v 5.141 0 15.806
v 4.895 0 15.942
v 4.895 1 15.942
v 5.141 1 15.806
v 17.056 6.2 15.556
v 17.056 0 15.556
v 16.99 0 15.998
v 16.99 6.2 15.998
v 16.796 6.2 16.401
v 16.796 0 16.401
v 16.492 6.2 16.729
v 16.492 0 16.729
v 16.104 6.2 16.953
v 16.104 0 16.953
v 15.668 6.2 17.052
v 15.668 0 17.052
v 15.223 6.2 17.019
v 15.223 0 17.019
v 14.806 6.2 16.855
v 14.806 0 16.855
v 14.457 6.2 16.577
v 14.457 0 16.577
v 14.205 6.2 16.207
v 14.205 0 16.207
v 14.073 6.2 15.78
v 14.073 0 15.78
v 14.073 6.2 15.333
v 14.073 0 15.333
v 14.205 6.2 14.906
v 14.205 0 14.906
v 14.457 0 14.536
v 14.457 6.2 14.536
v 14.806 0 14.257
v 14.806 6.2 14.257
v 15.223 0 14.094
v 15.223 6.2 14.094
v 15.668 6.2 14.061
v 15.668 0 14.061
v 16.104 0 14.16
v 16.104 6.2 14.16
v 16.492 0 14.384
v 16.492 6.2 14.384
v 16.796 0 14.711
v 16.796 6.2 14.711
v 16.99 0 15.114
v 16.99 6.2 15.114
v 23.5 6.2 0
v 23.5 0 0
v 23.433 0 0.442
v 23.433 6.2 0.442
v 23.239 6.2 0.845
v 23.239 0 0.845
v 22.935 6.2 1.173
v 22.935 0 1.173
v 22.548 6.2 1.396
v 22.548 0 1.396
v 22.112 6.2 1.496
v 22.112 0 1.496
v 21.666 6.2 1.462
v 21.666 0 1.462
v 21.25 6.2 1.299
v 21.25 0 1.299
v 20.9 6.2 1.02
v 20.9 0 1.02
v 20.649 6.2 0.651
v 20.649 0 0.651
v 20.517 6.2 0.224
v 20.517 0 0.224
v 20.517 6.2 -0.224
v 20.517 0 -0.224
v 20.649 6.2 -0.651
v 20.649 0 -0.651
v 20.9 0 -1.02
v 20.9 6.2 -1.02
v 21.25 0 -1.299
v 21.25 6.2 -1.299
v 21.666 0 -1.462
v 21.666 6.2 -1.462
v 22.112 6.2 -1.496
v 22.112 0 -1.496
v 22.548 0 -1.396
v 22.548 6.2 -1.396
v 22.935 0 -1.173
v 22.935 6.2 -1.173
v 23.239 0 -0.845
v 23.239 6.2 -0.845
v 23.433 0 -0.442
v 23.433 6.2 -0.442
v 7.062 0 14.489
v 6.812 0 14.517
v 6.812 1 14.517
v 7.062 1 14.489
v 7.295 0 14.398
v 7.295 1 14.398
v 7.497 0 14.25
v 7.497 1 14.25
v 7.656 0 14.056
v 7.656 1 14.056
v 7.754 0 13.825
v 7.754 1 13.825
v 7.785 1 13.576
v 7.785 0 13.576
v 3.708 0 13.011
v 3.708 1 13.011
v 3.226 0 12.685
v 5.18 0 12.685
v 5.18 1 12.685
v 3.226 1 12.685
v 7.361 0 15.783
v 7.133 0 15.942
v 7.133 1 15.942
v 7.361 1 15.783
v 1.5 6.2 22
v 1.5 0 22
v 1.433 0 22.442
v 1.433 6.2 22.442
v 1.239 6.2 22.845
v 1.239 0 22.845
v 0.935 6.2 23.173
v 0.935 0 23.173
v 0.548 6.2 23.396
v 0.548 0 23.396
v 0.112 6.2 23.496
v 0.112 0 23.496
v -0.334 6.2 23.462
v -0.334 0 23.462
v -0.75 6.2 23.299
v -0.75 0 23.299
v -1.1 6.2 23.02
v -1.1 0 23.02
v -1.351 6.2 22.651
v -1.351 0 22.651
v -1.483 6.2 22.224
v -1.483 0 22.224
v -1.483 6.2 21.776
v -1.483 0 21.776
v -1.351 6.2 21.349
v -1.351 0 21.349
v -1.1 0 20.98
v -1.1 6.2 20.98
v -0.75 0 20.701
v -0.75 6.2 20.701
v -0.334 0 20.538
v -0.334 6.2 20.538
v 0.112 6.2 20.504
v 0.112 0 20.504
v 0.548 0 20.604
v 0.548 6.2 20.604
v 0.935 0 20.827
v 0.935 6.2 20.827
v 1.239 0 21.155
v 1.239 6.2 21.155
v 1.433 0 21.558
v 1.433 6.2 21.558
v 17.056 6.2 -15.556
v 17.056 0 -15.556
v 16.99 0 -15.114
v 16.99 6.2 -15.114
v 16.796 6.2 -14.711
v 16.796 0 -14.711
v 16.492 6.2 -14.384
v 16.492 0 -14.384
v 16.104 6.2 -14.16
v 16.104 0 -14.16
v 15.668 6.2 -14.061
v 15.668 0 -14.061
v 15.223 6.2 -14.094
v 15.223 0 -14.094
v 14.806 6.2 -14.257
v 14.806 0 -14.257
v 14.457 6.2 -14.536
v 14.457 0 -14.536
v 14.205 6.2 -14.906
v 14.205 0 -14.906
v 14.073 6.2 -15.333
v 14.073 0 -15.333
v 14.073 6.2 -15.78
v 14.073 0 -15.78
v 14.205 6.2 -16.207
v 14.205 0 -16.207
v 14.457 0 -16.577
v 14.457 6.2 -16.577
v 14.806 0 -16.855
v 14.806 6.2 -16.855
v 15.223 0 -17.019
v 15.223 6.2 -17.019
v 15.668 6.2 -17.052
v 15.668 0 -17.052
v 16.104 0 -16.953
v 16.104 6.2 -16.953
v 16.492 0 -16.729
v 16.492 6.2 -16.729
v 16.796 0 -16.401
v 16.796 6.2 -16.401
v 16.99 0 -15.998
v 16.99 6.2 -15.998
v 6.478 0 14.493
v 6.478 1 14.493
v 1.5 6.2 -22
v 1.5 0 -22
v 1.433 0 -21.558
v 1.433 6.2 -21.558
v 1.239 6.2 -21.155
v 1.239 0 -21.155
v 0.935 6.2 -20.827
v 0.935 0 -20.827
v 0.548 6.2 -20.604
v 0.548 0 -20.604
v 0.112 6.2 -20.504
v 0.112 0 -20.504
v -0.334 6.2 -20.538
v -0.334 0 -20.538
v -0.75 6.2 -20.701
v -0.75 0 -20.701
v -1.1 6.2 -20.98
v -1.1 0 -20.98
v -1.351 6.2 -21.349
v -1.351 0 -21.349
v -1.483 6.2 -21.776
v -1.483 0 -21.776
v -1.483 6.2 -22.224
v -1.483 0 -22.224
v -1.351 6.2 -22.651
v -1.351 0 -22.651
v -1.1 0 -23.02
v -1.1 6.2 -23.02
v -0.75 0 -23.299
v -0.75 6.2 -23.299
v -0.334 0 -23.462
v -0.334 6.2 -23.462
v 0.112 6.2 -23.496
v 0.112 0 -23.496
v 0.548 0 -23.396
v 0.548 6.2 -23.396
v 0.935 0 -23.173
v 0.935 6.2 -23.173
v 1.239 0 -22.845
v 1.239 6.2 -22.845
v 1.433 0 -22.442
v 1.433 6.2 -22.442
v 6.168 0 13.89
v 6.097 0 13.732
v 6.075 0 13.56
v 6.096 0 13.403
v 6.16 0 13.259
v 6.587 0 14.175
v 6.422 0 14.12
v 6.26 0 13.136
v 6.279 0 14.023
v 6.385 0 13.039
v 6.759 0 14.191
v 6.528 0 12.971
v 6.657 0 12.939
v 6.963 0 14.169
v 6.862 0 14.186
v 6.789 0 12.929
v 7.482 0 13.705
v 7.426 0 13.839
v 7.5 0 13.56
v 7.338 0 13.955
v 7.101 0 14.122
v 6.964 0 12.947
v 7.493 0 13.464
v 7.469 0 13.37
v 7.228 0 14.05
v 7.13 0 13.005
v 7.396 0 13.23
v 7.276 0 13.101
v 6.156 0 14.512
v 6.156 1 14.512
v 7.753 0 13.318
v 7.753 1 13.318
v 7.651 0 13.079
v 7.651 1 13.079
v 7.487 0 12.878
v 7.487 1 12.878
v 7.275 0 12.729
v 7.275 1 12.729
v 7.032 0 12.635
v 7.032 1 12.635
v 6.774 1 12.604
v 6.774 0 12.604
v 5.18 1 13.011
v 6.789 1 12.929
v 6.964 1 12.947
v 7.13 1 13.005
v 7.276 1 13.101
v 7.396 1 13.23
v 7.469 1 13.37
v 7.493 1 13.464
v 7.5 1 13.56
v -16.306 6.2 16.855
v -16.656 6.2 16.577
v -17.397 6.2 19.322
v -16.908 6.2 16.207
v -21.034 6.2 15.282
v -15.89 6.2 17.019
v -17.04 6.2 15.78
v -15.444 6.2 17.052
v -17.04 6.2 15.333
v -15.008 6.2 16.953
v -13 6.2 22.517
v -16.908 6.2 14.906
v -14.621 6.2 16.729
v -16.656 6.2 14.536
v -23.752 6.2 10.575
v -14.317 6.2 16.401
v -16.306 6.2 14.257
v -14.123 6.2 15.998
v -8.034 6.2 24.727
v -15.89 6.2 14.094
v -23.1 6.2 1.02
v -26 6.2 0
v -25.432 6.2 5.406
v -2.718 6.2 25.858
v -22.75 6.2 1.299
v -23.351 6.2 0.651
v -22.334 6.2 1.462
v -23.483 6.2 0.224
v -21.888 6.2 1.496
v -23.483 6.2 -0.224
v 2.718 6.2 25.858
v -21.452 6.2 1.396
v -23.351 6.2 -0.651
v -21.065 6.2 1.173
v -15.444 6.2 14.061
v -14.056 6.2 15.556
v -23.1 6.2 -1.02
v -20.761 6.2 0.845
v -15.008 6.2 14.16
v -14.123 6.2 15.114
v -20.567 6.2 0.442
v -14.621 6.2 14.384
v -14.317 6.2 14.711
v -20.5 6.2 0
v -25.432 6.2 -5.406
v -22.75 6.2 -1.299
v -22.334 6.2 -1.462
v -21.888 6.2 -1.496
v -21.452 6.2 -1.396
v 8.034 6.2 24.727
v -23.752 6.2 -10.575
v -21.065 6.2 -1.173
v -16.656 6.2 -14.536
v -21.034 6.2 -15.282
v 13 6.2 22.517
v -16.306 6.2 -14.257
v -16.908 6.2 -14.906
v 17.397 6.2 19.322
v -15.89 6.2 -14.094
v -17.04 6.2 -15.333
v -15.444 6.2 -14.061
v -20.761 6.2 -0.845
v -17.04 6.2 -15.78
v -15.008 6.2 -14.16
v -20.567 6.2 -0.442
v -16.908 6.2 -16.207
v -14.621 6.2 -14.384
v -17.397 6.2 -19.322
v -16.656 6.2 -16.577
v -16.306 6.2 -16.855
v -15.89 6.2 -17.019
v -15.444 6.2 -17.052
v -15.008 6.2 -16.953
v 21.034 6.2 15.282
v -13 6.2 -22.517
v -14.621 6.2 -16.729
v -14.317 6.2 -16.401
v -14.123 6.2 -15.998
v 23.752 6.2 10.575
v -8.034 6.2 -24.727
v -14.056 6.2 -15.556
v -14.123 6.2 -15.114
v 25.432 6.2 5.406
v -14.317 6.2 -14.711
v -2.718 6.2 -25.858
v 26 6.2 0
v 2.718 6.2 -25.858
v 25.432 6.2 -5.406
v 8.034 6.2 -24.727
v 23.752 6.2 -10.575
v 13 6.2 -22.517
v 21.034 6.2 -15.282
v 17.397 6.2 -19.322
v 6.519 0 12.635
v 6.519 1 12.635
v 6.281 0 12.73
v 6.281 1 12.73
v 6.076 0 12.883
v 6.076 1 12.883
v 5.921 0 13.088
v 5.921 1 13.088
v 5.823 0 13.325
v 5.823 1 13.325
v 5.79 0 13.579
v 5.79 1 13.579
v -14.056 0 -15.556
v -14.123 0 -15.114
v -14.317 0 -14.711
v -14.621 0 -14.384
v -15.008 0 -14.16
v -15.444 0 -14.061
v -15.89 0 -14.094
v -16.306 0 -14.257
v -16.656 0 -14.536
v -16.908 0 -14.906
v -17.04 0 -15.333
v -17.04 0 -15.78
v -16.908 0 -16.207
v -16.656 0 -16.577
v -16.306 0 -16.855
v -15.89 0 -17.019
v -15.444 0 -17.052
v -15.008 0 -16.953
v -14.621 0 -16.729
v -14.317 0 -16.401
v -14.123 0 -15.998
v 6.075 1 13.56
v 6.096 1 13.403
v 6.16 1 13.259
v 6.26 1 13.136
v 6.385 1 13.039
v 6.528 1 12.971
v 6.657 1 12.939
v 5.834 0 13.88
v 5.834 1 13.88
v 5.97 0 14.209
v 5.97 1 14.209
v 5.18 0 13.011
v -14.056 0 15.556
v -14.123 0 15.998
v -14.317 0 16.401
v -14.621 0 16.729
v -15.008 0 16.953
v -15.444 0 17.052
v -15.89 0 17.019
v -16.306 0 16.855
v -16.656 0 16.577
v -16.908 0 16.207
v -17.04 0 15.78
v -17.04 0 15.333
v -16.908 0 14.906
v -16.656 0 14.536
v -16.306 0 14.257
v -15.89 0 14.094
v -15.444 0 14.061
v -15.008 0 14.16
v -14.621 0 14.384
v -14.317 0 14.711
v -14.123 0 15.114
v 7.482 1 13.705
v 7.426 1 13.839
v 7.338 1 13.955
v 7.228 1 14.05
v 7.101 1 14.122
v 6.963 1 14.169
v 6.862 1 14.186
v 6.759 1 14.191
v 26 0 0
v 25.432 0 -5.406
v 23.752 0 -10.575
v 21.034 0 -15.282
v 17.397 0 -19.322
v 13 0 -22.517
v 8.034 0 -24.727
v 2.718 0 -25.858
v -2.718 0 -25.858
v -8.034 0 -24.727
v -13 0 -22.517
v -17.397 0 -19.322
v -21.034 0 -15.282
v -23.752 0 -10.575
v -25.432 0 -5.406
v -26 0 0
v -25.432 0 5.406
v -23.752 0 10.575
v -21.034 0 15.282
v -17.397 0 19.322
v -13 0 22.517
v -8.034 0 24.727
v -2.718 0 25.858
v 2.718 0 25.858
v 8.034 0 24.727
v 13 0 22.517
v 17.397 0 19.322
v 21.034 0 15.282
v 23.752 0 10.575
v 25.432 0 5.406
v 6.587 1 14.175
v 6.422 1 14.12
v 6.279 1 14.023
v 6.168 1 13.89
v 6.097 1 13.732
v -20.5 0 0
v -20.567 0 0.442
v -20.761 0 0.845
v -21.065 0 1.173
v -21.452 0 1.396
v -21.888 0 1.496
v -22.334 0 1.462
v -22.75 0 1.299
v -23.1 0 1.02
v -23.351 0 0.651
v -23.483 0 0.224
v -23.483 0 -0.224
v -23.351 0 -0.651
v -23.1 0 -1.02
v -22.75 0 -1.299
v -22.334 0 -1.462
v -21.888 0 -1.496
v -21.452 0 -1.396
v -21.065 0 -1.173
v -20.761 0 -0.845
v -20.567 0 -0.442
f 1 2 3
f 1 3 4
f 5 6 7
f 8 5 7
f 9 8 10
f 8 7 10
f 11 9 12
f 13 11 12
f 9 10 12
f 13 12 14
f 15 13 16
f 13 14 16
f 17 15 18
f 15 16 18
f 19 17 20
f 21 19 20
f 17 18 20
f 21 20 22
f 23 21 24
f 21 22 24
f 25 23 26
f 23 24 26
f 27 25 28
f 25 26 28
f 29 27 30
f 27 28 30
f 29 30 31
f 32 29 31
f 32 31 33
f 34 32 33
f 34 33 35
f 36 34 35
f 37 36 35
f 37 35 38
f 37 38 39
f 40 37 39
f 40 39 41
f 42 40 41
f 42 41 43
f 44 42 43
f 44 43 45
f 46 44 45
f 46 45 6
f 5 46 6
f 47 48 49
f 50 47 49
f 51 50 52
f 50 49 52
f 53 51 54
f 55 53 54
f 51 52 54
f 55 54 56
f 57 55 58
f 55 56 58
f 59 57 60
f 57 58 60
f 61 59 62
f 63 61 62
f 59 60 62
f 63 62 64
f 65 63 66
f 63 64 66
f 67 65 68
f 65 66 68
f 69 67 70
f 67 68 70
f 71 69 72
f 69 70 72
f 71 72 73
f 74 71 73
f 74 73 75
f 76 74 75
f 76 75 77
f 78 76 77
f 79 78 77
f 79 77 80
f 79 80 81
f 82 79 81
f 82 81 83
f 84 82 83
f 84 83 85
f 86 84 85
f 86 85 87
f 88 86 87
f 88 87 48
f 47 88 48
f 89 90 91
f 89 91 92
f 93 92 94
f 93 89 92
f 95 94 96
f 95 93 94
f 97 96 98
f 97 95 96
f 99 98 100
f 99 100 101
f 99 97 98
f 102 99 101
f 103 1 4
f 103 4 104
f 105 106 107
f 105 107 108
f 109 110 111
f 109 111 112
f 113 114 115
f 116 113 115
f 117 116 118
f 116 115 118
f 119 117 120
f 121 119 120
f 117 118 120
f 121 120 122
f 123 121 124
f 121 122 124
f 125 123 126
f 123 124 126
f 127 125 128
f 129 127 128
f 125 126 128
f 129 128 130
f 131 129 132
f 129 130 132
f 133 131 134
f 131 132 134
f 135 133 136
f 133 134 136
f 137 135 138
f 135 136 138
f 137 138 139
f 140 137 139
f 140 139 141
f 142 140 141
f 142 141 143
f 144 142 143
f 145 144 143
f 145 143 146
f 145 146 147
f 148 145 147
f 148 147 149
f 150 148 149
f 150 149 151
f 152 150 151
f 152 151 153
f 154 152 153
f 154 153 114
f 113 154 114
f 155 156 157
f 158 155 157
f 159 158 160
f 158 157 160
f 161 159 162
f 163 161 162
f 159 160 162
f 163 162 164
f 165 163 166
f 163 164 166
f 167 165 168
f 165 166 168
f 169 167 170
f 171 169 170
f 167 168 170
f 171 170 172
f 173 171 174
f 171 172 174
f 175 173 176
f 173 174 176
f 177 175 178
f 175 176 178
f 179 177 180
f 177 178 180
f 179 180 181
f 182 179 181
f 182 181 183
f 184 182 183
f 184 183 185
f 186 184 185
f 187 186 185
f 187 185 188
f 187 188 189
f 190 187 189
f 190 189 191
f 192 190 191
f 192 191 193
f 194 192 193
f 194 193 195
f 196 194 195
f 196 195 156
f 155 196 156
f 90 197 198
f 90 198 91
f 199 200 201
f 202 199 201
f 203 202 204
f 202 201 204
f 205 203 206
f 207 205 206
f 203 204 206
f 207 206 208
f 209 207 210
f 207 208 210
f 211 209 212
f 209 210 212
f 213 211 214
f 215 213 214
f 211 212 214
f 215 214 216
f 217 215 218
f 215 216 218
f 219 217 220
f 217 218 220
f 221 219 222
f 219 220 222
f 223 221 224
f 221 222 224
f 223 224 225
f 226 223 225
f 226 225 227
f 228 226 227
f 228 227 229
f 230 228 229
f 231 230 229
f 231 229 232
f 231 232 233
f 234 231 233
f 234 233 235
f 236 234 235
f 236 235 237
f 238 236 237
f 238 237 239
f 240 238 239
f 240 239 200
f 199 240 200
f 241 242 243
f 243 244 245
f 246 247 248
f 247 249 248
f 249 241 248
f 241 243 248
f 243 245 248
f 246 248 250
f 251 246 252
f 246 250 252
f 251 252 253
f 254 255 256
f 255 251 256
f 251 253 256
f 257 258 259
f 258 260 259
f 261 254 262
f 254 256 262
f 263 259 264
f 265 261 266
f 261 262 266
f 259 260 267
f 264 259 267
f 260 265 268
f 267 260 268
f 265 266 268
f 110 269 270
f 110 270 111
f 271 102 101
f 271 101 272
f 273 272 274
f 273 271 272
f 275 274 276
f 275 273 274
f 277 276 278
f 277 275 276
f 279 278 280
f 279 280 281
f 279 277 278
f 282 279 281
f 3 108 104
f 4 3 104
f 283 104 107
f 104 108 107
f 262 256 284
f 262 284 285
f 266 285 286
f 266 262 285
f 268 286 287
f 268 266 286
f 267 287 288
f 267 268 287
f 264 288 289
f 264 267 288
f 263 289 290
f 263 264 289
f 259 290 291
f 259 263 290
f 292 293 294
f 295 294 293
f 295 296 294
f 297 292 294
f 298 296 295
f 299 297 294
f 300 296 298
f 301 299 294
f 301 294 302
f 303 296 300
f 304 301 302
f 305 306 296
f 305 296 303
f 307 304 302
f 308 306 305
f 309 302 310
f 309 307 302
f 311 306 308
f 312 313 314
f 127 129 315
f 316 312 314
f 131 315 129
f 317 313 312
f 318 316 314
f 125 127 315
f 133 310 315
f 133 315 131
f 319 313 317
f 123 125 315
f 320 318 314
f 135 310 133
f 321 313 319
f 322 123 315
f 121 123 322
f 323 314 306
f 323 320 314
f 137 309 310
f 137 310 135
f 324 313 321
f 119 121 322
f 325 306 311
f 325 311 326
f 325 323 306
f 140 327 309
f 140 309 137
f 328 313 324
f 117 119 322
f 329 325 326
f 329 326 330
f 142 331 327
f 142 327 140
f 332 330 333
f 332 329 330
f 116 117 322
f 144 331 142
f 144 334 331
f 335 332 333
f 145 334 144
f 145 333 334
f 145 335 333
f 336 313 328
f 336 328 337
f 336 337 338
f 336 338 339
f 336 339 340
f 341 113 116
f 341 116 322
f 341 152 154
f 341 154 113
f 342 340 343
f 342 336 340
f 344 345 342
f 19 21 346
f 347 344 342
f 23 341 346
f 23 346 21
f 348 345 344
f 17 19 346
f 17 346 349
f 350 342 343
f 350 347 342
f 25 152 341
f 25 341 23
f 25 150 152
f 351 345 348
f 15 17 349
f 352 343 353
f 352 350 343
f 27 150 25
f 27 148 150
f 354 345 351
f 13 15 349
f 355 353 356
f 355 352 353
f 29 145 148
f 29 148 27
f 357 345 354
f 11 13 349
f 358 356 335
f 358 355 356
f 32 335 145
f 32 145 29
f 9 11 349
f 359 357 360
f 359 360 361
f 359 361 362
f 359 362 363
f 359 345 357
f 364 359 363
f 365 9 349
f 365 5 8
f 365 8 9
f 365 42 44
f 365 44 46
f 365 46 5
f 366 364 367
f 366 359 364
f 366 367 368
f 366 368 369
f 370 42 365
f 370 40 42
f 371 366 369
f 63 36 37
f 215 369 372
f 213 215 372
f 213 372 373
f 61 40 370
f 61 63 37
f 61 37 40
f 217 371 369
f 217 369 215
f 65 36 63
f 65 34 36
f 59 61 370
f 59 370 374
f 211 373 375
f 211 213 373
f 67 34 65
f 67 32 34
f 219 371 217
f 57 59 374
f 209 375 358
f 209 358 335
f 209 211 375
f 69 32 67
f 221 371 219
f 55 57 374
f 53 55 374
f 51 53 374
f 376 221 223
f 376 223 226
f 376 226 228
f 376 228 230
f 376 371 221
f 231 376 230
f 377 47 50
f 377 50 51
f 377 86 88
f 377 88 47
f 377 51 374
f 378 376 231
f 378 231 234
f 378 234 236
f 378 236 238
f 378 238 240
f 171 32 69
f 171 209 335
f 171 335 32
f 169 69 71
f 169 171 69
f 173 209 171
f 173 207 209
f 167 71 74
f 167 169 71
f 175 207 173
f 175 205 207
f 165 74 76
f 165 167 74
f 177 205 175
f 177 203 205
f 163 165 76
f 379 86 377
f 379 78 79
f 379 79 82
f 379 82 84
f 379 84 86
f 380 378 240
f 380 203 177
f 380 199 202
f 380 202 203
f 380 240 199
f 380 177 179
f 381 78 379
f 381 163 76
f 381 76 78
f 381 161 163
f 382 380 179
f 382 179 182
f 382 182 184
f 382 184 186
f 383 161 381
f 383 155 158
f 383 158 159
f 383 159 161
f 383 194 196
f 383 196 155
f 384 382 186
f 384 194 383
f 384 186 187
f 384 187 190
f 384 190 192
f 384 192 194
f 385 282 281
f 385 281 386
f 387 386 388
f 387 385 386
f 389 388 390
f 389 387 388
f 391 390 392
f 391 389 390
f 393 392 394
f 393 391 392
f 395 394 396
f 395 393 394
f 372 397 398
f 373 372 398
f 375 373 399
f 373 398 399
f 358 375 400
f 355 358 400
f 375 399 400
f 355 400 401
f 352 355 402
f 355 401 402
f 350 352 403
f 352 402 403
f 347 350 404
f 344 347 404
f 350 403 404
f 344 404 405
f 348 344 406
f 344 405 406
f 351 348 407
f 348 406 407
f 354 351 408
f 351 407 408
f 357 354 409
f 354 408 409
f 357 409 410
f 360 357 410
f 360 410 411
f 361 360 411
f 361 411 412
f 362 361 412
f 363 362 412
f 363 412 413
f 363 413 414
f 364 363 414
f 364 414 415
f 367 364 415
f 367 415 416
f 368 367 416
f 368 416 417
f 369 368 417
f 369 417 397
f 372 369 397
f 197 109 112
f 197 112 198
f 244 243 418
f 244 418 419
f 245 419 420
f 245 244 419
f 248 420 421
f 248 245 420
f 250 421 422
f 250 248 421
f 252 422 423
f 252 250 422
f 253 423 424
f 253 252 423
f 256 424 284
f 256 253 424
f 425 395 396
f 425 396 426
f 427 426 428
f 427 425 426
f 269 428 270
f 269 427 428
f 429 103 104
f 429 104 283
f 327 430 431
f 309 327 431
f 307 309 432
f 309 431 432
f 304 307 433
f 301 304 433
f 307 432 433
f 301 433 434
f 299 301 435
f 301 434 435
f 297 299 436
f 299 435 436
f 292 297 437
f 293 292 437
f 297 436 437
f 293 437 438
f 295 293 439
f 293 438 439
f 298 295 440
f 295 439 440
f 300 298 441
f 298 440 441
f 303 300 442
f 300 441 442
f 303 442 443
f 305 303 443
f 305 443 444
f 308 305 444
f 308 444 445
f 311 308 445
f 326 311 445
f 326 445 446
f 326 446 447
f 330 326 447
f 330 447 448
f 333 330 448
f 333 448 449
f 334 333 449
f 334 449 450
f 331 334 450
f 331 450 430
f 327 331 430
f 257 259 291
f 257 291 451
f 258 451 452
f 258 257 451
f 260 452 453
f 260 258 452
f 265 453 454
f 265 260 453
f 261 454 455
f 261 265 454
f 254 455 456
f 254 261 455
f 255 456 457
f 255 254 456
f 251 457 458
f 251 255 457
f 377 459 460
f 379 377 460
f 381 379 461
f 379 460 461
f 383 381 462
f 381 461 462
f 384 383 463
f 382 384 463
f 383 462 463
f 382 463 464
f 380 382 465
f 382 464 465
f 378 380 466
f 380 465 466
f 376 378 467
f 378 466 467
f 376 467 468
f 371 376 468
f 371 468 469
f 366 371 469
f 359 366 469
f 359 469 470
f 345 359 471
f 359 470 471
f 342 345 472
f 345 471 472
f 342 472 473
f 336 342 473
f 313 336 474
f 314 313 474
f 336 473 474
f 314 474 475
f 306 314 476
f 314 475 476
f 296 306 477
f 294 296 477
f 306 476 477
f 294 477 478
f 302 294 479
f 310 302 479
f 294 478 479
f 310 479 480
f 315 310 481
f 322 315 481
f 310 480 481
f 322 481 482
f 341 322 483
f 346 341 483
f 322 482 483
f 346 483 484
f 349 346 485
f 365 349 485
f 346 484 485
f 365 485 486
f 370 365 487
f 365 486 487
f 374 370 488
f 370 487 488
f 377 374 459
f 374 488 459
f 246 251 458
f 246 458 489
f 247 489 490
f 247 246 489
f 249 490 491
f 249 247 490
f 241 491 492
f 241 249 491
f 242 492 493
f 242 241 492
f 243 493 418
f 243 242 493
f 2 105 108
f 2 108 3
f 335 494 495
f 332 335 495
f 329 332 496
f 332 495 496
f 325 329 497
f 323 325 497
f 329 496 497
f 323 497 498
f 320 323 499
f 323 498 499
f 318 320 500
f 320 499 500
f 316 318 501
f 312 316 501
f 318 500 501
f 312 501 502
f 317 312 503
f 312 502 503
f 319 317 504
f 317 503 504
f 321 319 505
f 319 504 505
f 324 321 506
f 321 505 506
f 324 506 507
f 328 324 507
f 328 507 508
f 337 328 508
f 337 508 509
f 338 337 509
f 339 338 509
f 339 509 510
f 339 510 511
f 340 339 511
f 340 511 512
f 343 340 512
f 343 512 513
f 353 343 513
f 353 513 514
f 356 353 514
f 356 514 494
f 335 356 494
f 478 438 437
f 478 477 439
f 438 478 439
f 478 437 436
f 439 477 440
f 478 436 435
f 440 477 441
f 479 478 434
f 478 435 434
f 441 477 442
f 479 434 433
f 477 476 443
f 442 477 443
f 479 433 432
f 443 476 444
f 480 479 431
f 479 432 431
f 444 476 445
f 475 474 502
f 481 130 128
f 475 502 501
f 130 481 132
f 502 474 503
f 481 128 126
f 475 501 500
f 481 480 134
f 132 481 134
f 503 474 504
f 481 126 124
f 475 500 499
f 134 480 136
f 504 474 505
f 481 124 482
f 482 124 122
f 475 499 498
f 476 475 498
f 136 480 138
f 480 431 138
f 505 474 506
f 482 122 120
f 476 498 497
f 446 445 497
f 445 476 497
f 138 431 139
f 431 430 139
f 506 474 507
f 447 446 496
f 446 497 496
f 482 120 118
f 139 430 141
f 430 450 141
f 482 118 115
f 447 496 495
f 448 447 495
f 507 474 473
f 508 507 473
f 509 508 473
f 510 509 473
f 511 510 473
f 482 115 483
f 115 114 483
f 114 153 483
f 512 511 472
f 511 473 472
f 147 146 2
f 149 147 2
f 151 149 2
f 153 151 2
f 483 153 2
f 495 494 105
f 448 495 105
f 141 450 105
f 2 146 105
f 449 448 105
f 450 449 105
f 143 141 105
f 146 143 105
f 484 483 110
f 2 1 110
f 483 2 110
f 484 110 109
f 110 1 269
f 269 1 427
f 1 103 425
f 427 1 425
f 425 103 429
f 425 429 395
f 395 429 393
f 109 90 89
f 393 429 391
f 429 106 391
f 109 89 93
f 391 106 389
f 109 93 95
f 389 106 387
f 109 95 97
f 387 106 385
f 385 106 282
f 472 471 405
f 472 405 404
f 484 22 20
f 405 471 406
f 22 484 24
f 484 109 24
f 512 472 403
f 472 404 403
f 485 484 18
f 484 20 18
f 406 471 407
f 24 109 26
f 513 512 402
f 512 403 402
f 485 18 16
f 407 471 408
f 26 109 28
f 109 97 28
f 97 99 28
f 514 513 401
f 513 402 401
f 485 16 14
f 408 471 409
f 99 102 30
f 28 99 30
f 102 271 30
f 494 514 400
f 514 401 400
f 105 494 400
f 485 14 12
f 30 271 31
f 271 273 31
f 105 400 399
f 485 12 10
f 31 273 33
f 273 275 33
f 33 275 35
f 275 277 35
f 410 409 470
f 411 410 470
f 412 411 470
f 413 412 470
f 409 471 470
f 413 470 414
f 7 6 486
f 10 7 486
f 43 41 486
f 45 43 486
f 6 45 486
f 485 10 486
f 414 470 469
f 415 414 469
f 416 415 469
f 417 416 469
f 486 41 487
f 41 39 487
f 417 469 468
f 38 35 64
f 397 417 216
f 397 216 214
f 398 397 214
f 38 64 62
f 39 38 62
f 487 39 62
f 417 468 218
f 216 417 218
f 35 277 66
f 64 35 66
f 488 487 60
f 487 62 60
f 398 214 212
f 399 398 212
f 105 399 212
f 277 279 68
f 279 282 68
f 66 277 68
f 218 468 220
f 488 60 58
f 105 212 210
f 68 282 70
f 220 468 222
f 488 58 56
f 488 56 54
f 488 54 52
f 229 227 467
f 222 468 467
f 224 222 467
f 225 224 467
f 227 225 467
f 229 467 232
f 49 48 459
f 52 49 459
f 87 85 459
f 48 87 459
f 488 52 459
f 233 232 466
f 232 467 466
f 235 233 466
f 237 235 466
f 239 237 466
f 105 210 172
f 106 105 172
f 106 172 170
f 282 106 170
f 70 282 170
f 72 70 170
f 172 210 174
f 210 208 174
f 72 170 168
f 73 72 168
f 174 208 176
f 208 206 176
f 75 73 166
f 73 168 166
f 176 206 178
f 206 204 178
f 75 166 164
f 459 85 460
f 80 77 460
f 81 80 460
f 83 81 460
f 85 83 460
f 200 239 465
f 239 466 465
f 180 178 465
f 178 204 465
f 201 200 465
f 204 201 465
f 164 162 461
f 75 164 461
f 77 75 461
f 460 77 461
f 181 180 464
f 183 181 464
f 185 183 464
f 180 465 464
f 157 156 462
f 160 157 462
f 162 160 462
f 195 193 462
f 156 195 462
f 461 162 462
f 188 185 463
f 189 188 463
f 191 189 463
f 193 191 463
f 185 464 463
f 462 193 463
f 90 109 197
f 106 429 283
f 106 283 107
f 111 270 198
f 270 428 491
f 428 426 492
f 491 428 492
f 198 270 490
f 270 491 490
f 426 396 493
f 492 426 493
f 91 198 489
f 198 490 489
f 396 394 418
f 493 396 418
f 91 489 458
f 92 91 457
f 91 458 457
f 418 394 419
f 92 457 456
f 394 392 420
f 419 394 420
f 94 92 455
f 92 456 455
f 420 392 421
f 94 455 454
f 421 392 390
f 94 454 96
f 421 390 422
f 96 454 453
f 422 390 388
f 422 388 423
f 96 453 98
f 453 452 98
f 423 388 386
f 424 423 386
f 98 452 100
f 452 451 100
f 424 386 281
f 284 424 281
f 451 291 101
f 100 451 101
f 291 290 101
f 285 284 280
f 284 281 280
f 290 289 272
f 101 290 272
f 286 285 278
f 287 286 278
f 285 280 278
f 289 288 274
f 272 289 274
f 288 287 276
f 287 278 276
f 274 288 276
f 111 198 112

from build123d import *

# Parameters (mm, degrees)
SKETCH1_R           = 26
BOSS_EXTRUDE1_DEPTH = 6.2
SKETCH4_R           = 1.5
CUT_EXTRUDE1_DEPTH  = 13
SKETCH5_R           = 1.5
CUT_EXTRUDE2_DEPTH  = 10
CUT_EXTRUDE3_DEPTH  = 1


with BuildPart() as part:
    # Sketch1 → Boss-Extrude1 (new body)
    with BuildSketch(Plane(origin=(0, 0, 0), x_dir=(1, 0, 0), z_dir=(0, 1, 0))):
        Circle(SKETCH1_R)
    extrude(amount=BOSS_EXTRUDE1_DEPTH)

    # Sketch4 → Cut-Extrude1 (cut)
    with BuildSketch(Plane.XZ):
        with Locations((22, 0)):
            Circle(SKETCH4_R)
    extrude(amount=-CUT_EXTRUDE1_DEPTH, mode=Mode.SUBTRACT)

    # Sketch5 → Cut-Extrude2 (cut)
    with BuildSketch(Plane.XZ):
        with Locations((-22, 0)):
            Circle(SKETCH5_R)
        with Locations((0, 22)):
            Circle(SKETCH5_R)
        with Locations((0, -22)):
            Circle(SKETCH5_R)
        with Locations((-15.556349186, 15.556349186)):
            Circle(SKETCH5_R)
        with Locations((15.556349186, 15.556349186)):
            Circle(SKETCH5_R)
        with Locations((15.556349186, -15.556349186)):
            Circle(SKETCH5_R)
        with Locations((-15.556349186, -15.556349186)):
            Circle(SKETCH5_R)
    extrude(amount=-CUT_EXTRUDE2_DEPTH, mode=Mode.SUBTRACT)

    # Sketch6 → Cut-Extrude3 (cut)
    with BuildSketch(Plane(origin=(0, 0, 0), x_dir=(-1, 0, 0), z_dir=(0, -1, 0))):
        with BuildLine():
            Line((-7.133469585, -15.941578498), (-7.361163896, -15.783210108))
            Line((-7.361163896, -15.783210108), (-6.478371428, -14.492730341))
            add(Edge.make_bspline(
                [(-6.478371428, -14.492730341), (-6.534696595, -14.499618334), (-6.64560399, -14.513181177), (-6.757306933, -14.515672785), (-6.812280683, -14.516899011)],
                knots=[0, 0, 0, 0, 0.000170115, 0.000334967, 0.000334967, 0.000334967, 0.000334967], degree=3))
            add(Edge.make_bspline(
                [(-6.812280683, -14.516899011), (-6.845610969, -14.51604532), (-6.911035406, -14.5143696), (-7.007221263, -14.501087388), (-7.099646021, -14.4806312), (-7.188064651, -14.450106973), (-7.272809488, -14.412171883), (-7.353695528, -14.365130163), (-7.430613885, -14.309788742), (-7.502738465, -14.246440242), (-7.568335542, -14.176882295), (-7.626776676, -14.103262533), (-7.675346132, -14.02472576), (-7.715692748, -13.94287406), (-7.746291089, -13.856530978), (-7.768572819, -13.766679022), (-7.782290955, -13.672688461), (-7.783922991, -13.608712092), (-7.784751636, -13.576228939)],
                knots=[0, 0, 0, 0, 9.9954e-05, 0.000196201, 0.000290782, 0.000383503, 0.000476303, 0.000568919, 0.000663705, 0.000760153, 0.000856434, 0.000950205, 0.001041624, 0.001132931, 0.001223461, 0.001315861, 0.001410305, 0.001507717, 0.001507717, 0.001507717, 0.001507717], degree=3))
            add(Edge.make_bspline(
                [(-7.784751636, -13.576228939), (-7.783178256, -13.531807375), (-7.78009003, -13.444616857), (-7.755235661, -13.317223367), (-7.714359496, -13.196767002), (-7.657365183, -13.083564469), (-7.585578686, -12.979244184), (-7.499301608, -12.885256374), (-7.399058726, -12.802937828), (-7.287133608, -12.732176987), (-7.166163368, -12.675267382), (-7.039463942, -12.633321731), (-6.908006134, -12.608648581), (-6.818954033, -12.605395693), (-6.774119625, -12.603757985)],
                knots=[0, 0, 0, 0, 0.000133185, 0.000261414, 0.000387724, 0.00051373, 0.000640399, 0.00076644, 0.000895188, 0.001028407, 0.001162697, 0.001295241, 0.001427846, 0.0015623, 0.0015623, 0.0015623, 0.0015623], degree=3))
            add(Edge.make_bspline(
                [(-6.774119625, -12.603757985), (-6.730133702, -12.605418204), (-6.643221663, -12.608698641), (-6.515415207, -12.632723385), (-6.393004427, -12.673215224), (-6.276667904, -12.729171935), (-6.168954294, -12.799313044), (-6.072093379, -12.882892219), (-5.988295569, -12.979961519), (-5.917698191, -13.088173221), (-5.861028941, -13.204438982), (-5.820141941, -13.325800112), (-5.794972683, -13.451383809), (-5.791801015, -13.536468796), (-5.790200354, -13.579409027)],
                knots=[0, 0, 0, 0, 0.000131915, 0.000260652, 0.000388569, 0.000517718, 0.000646848, 0.000773094, 0.000900237, 0.001030248, 0.001159674, 0.001287189, 0.001413545, 0.001542287, 0.001542287, 0.001542287, 0.001542287], degree=3))
            add(Edge.make_bspline(
                [(-5.790200354, -13.579409027), (-5.79126934, -13.612740873), (-5.793437509, -13.680346185), (-5.80861973, -13.783062281), (-5.834400898, -13.887793039), (-5.863657796, -13.976440487), (-5.89189912, -14.049654581), (-5.918479432, -14.107486371), (-5.9479726, -14.168356803), (-5.982370337, -14.231627602), (-6.019347564, -14.29810533), (-6.061129907, -14.367123223), (-6.106764248, -14.438773895), (-6.139266922, -14.48707661), (-6.155910491, -14.51181087)],
                knots=[0, 0, 0, 0, 9.9984e-05, 0.000202793, 0.000310776, 0.000423207, 0.000482616, 0.000546097, 0.000614079, 0.0006855, 0.000762103, 0.000842274, 0.000927493, 0.001016928, 0.001016928, 0.001016928, 0.001016928], degree=3))
            Line((-6.155910491, -14.51181087), (-7.133469585, -15.941578498))
        make_face()
        with BuildLine():
            add(Edge.make_bspline(
                [(-6.75949122, -14.191257985), (-6.734241793, -14.190568208), (-6.685089742, -14.189225448), (-6.613083192, -14.181052778), (-6.545116236, -14.166562091), (-6.481007317, -14.145770638), (-6.420113628, -14.120682088), (-6.363402387, -14.088739786), (-6.310826133, -14.050624696), (-6.262032799, -14.007798468), (-6.218704028, -13.960218295), (-6.180111422, -13.910418777), (-6.147308621, -13.85818131), (-6.121397648, -13.802851707), (-6.100093783, -13.745776811), (-6.08538173, -13.686037503), (-6.077231656, -13.623945025), (-6.075842299, -13.5817641), (-6.075136252, -13.560328498)],
                knots=[0, 0, 0, 0, 7.5753e-05, 0.000147465, 0.000217073, 0.000283852, 0.000349411, 0.000414338, 0.000478589, 0.000543925, 0.000608743, 0.000671332, 0.000732749, 0.000793345, 0.000854313, 0.000915245, 0.00097749, 0.001041807, 0.001041807, 0.001041807, 0.001041807], degree=3))
            add(Edge.make_bspline(
                [(-6.075136252, -13.560328498), (-6.075743737, -13.538883944), (-6.076940862, -13.496624821), (-6.086545056, -13.434440415), (-6.103440794, -13.374847242), (-6.126110733, -13.317519052), (-6.155974092, -13.262926858), (-6.191809397, -13.21038526), (-6.234383834, -13.160227401), (-6.283371876, -13.11363293), (-6.336198935, -13.070681622), (-6.392496674, -13.032775681), (-6.451801062, -13.001006453), (-6.513750292, -12.974790959), (-6.578473437, -12.954333277), (-6.645932198, -12.93962181), (-6.716467459, -12.931483147), (-6.764347626, -12.930102571), (-6.788748031, -12.929399011)],
                knots=[0, 0, 0, 0, 6.4316e-05, 0.000126743, 0.000188161, 0.000249812, 0.000311283, 0.000374438, 0.00044032, 0.000508243, 0.00057698, 0.000644365, 0.000711521, 0.0007785, 0.000845884, 0.000914871, 0.00098532, 0.001058531, 0.001058531, 0.001058531, 0.001058531], degree=3))
            add(Edge.make_bspline(
                [(-6.788748031, -12.929399011), (-6.812936227, -12.930103708), (-6.860393269, -12.931486318), (-6.930301471, -12.93960634), (-6.997304101, -12.954432215), (-7.061839714, -12.974781483), (-7.123787103, -13.001008409), (-7.183088694, -13.032777346), (-7.239399603, -13.070672896), (-7.292176014, -13.113666725), (-7.341250557, -13.160010519), (-7.383093001, -13.210604986), (-7.419010318, -13.262899526), (-7.448832642, -13.317526316), (-7.471513497, -13.374845304), (-7.488406312, -13.43444094), (-7.498011291, -13.496624685), (-7.499208308, -13.538883898), (-7.499815739, -13.560328498)],
                knots=[0, 0, 0, 0, 7.2576e-05, 0.000142393, 0.000210758, 0.000278143, 0.000345121, 0.000412278, 0.000479663, 0.0005484, 0.000616323, 0.000681795, 0.00074495, 0.000806421, 0.000868072, 0.00092949, 0.000991917, 0.001056233, 0.001056233, 0.001056233, 0.001056233], degree=3))
            add(Edge.make_bspline(
                [(-7.499815739, -13.560328498), (-7.499266077, -13.581780792), (-7.498182044, -13.624088644), (-7.487724692, -13.686251872), (-7.470236538, -13.745840447), (-7.446814663, -13.803433775), (-7.415970363, -13.858471817), (-7.378120872, -13.910693638), (-7.333756556, -13.960691225), (-7.283470463, -14.007687768), (-7.228435774, -14.050824384), (-7.169655869, -14.088498373), (-7.10814266, -14.120314091), (-7.043679609, -14.145842346), (-6.97674444, -14.166354355), (-6.906735571, -14.181026071), (-6.833884527, -14.189147056), (-6.784526901, -14.190547591), (-6.75949122, -14.191257985)],
                knots=[0, 0, 0, 0, 6.4316e-05, 0.000126844, 0.000188436, 0.000250326, 0.000312966, 0.000377217, 0.000443451, 0.000513196, 0.000583426, 0.000652939, 0.000722346, 0.000790847, 0.000860662, 0.000932137, 0.001005113, 0.00108023, 0.00108023, 0.00108023, 0.00108023], degree=3))
        make_face(mode=Mode.SUBTRACT)
        Polygon((-5.179623431, -12.685168241), (-3.225777277, -12.685168241), (-4.894687534, -15.941578498), (-5.140826356, -15.806106743), (-3.70787864, -13.010809267), (-5.179623431, -13.010809267), align=None)
    extrude(amount=-CUT_EXTRUDE3_DEPTH, mode=Mode.SUBTRACT)


solid = part.part
